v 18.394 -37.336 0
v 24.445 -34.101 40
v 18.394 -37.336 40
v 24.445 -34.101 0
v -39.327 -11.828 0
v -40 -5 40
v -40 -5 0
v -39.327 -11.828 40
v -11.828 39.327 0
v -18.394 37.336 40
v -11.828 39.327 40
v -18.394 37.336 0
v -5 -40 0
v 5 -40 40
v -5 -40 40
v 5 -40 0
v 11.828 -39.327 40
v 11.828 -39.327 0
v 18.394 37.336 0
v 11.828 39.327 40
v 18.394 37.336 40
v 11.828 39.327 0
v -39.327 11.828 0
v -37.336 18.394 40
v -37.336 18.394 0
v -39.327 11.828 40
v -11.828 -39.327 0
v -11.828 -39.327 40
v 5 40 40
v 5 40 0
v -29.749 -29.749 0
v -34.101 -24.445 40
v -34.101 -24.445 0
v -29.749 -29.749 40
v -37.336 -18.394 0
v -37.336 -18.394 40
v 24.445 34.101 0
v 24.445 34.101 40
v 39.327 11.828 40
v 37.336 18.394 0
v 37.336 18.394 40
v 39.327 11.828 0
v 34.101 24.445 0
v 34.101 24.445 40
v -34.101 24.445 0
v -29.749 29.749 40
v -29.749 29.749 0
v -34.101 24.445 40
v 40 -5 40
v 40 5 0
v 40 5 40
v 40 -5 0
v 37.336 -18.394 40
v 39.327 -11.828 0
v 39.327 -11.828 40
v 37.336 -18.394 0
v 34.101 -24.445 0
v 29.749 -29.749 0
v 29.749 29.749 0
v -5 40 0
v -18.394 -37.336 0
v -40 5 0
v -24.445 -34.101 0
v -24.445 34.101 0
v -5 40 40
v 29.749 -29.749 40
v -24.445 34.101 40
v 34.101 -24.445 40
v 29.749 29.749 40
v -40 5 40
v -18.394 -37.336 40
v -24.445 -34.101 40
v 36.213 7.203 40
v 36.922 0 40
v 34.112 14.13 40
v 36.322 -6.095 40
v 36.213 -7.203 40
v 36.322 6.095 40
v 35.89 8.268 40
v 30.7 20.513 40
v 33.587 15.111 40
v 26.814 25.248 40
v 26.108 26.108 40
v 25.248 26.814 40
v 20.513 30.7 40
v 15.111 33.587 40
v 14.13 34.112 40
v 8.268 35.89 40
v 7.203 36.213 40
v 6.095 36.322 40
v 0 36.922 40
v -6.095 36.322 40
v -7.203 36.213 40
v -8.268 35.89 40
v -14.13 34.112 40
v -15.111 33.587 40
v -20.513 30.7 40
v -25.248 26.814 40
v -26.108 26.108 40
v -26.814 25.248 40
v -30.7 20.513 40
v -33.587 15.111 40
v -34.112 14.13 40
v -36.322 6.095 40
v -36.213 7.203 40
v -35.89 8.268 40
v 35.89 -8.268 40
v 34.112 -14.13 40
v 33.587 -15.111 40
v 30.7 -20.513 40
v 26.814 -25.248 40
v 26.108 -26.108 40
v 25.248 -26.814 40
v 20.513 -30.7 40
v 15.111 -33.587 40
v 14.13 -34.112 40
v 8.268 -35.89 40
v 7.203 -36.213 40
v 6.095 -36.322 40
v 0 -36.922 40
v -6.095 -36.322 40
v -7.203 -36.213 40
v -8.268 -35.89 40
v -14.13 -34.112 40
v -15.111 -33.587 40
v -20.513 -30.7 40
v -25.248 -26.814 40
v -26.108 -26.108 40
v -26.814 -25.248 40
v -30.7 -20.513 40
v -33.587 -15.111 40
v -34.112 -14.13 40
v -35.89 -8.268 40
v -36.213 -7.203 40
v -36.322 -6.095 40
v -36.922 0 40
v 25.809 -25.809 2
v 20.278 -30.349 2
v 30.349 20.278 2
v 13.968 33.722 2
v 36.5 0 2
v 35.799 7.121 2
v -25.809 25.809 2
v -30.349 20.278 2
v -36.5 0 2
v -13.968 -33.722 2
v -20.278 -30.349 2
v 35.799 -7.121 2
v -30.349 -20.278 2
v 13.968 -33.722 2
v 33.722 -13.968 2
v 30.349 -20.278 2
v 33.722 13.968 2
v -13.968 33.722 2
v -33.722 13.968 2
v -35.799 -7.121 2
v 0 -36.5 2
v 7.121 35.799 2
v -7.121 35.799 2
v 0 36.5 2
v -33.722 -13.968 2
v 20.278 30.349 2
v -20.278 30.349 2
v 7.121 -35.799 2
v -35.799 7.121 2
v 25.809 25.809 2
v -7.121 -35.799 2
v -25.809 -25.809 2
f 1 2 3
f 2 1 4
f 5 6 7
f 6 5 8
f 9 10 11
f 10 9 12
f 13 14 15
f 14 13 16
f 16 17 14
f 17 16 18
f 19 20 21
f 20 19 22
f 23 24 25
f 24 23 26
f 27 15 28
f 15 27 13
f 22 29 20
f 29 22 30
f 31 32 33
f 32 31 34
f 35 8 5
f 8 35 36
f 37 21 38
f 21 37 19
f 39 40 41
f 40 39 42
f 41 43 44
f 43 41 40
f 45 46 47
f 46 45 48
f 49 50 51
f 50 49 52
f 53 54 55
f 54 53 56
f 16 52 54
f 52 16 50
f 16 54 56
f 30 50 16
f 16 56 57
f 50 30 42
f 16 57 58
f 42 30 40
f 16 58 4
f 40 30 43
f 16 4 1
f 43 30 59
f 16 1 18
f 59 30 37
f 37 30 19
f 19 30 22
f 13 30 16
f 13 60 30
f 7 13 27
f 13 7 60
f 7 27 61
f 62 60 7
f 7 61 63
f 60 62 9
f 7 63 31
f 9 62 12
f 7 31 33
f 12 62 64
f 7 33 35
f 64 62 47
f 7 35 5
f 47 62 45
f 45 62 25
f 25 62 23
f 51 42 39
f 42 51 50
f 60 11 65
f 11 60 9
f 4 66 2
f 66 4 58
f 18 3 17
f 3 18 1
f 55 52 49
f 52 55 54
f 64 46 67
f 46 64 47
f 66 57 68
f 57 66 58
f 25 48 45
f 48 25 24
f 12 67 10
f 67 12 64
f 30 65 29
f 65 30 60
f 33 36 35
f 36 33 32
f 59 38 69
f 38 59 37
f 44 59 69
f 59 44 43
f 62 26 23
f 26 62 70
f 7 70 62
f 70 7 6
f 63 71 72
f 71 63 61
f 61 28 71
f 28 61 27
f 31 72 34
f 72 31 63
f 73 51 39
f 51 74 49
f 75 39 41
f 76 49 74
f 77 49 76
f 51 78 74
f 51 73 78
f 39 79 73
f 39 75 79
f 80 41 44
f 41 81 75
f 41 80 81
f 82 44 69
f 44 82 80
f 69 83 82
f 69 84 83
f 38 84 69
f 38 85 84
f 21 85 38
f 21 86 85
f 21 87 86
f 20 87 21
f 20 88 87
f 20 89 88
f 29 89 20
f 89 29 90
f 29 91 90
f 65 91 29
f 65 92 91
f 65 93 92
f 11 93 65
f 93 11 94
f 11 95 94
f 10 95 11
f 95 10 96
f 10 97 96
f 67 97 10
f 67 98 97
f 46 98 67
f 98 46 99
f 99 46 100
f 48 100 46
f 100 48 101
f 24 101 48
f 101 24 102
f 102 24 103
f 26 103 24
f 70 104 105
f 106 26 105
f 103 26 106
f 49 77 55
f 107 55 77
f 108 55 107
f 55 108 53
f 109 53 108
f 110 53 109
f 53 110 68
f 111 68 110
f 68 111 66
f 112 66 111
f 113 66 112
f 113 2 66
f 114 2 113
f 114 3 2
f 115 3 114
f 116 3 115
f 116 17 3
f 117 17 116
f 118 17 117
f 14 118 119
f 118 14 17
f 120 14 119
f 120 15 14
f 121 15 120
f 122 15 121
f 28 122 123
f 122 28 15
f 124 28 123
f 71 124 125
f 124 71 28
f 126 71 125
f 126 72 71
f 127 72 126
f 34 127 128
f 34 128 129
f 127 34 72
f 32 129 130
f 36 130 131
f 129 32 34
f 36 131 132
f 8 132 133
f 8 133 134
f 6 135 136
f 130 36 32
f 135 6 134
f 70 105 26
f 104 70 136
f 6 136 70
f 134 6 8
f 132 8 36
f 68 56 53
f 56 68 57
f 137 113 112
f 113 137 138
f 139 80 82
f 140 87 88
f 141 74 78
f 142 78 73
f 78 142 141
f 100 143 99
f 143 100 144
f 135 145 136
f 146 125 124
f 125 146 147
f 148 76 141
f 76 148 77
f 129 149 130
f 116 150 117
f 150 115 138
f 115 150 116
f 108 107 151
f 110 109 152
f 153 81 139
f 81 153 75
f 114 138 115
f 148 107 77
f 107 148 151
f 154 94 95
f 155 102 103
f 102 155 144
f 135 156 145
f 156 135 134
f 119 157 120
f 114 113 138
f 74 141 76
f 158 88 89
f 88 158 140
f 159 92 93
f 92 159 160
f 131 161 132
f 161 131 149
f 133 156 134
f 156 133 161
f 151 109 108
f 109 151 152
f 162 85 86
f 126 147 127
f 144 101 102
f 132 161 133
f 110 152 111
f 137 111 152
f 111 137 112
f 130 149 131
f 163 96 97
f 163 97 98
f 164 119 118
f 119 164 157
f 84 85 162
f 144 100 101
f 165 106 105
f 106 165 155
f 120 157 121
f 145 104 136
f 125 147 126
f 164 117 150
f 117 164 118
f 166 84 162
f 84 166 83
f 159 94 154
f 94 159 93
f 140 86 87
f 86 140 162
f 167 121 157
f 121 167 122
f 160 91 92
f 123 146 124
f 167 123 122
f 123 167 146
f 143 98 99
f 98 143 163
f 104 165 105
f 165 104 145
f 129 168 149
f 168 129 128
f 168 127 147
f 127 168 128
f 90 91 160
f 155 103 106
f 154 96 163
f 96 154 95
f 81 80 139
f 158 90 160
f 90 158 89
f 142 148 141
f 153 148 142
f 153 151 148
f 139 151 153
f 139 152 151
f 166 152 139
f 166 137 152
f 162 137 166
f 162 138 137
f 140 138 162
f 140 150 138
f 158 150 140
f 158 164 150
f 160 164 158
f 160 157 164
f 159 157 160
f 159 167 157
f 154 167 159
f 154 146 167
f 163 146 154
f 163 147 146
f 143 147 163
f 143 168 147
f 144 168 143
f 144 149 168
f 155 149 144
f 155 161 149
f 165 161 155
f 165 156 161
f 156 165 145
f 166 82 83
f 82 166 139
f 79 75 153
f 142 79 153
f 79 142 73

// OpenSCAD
$fn= 32;

height = 40;

difference() {
    hull() {
        translate([-10/2,-10/2,0]) cylinder(d=70, h= height);
        translate([-10/2,10/2,0]) cylinder(d=70, h= height);
        translate([10/2,-10/2,0]) cylinder(d=70, h= height);
        translate([10/2,10/2,0]) cylinder(d=70, h= height);
    }
    translate([0, 0, 2]) {
        cylinder(d1=73, d2=74, h=height+5);
    } 
}
